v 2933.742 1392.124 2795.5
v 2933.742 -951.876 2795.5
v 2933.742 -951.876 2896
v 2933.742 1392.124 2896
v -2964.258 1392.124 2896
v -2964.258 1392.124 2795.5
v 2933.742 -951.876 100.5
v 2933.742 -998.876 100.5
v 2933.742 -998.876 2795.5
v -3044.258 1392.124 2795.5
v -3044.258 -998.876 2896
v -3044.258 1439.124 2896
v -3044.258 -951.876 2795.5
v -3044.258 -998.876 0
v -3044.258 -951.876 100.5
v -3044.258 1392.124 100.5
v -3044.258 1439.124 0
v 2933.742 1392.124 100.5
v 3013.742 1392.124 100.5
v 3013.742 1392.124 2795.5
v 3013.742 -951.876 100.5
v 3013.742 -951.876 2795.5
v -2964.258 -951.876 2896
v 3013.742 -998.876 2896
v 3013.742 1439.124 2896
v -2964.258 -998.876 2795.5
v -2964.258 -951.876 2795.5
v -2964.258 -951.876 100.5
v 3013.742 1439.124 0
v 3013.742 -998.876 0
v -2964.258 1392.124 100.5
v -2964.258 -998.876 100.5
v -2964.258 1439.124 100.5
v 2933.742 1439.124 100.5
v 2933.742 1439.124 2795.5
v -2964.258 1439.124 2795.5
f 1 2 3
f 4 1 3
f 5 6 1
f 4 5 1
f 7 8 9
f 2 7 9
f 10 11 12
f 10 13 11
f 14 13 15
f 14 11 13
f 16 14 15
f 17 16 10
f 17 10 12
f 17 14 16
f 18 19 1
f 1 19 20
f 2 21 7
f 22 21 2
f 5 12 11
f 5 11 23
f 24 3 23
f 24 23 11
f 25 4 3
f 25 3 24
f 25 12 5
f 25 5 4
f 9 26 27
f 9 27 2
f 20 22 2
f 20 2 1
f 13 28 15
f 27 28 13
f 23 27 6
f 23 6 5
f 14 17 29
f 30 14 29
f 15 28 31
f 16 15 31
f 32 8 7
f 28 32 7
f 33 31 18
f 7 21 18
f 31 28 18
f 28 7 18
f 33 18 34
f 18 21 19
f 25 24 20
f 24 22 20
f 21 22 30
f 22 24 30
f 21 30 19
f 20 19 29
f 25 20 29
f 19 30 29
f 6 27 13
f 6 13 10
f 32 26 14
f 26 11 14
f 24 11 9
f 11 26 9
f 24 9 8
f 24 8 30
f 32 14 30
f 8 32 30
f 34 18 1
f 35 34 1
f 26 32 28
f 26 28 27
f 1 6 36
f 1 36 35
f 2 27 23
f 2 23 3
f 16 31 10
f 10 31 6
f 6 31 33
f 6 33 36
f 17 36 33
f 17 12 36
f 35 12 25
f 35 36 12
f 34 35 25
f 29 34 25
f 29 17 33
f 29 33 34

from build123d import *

# Parameters (mm, degrees)
SKETCH1_W               = 6058
SKETCH1_H               = 2438
BOSS_EXTRUDE1_DEPTH     = 2896
SKETCH4_W               = 5898
SKETCH4_H               = 2695
CUT_EXTRUDE1_DEPTH      = 4858.794444346
CUT_EXTRUDE2_DEPTH      = 4442.328605739
CUT_EXTRUDE2_DEPTH_BACK = 180
SKETCH8_W               = 5898
SKETCH8_H               = 2344
CUT_EXTRUDE3_DEPTH      = 6868.114162487
CUT_EXTRUDE3_DEPTH_BACK = 6868.114162487
SKETCH9_W               = 2695
SKETCH9_H               = 2344


with BuildPart() as part:
    # Sketch1 → Boss-Extrude1 (new body)
    with BuildSketch(Plane.XY):
        with Locations((-15.258015267, 220.123664122)):
            Rectangle(SKETCH1_W, SKETCH1_H)
    extrude(amount=BOSS_EXTRUDE1_DEPTH)

    # Sketch4 → Cut-Extrude1 (cut, through all)
    with BuildSketch(Plane.XZ.offset(998.876335878)):
        with Locations((-15.258015267, 1448)):
            Rectangle(SKETCH4_W, SKETCH4_H)
    extrude(amount=-CUT_EXTRUDE1_DEPTH, mode=Mode.SUBTRACT)

    # Sketch8 → Cut-Extrude2 (cut, two sides: drawn at the far end of the back side and taken through both)
    with BuildSketch(Plane.XY.offset(2896).offset(-CUT_EXTRUDE2_DEPTH_BACK)):
        with Locations((-15.258015267, 220.123664122)):
            Rectangle(SKETCH8_W, SKETCH8_H)
    extrude(amount=CUT_EXTRUDE2_DEPTH + CUT_EXTRUDE2_DEPTH_BACK, mode=Mode.SUBTRACT)

    # Sketch9 → Cut-Extrude3 (cut, two sides: drawn at the far end of the back side and taken through both)
    with BuildSketch(Plane.ZY.offset(3044.258015267).offset(-CUT_EXTRUDE3_DEPTH_BACK)):
        with Locations((1448, 220.123664122)):
            Rectangle(SKETCH9_W, SKETCH9_H)
    extrude(amount=CUT_EXTRUDE3_DEPTH + CUT_EXTRUDE3_DEPTH_BACK, mode=Mode.SUBTRACT)


solid = part.part
